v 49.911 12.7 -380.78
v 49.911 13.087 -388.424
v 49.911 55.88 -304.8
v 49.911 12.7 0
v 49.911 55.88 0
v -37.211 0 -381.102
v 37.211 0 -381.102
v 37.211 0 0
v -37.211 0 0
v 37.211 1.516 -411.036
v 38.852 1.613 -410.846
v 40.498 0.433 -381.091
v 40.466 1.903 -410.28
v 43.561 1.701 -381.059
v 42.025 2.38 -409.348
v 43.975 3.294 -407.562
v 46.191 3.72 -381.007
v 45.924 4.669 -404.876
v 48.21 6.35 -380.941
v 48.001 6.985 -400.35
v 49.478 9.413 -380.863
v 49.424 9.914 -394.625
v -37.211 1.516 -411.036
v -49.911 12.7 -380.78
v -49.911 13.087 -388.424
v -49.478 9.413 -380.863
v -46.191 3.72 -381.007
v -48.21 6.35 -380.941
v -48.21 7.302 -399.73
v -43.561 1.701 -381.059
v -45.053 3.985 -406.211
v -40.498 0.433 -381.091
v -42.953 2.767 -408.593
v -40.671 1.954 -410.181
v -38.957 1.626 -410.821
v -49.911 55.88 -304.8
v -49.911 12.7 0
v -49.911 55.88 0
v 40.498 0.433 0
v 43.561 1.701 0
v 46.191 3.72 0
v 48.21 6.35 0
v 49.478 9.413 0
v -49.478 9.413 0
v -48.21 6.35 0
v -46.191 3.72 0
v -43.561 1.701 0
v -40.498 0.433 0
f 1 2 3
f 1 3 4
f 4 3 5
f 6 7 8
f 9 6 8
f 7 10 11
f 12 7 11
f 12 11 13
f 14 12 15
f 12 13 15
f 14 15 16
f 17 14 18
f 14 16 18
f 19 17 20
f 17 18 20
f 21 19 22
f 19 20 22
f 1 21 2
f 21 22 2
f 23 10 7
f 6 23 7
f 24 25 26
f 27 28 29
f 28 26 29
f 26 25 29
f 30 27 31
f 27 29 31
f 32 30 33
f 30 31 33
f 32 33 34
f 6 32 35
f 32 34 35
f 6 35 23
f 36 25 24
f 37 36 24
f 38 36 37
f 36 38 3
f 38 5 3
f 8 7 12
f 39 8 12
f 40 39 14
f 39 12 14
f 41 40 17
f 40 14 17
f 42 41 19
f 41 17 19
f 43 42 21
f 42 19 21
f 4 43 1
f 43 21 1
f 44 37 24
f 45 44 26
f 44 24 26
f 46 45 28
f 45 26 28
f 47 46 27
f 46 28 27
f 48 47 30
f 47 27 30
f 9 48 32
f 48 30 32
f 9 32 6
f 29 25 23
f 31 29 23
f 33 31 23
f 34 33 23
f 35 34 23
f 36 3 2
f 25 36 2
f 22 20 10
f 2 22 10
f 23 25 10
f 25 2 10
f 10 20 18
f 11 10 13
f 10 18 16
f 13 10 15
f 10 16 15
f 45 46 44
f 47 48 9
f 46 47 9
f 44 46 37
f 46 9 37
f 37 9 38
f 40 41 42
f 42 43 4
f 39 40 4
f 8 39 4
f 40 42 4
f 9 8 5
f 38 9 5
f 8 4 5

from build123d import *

# Parameters (mm, degrees)
BOSS_EXTRUDE1_DEPTH = 49.911
FILLET1_R           = 12.7


with BuildPart() as part:
    # Sketch1 → Boss-Extrude1 (new, symmetric)
    with BuildSketch(Plane(origin=(0, 0, 0), x_dir=(0, 0, -1), z_dir=(1, 0, 0))):
        Polygon((0, 0), (0, 55.88), (304.8, 55.88), (411.035788296, 1.516400562), (381.1016, 0), align=None)
    extrude(amount=BOSS_EXTRUDE1_DEPTH, both=True)

    # Fillet1
    # the kernel refuses this fillet: 12.7 mm, written as the material it takes off along each edge
    with BuildSketch(Plane(origin=(49.911, 0, -412.8516), x_dir=(0, 1, 0), z_dir=(0, 0, 1))) as fillet1_piece_1:
        with BuildLine():
            CenterArc((FILLET1_R, FILLET1_R), FILLET1_R, 180, 90)
            Line((0, FILLET1_R), (0, 0))
            Line((0, 0), (FILLET1_R, 0))
        make_face()
    extrude(amount=444.6016, mode=Mode.SUBTRACT)
    with BuildSketch(Plane(origin=(-49.911, 3.12272641, -442.745127887), x_dir=(1, 0, 0), z_dir=(0, -0.0505929400767125, 0.9987193571841863)), Plane(origin=(49.911, 3.12272641, -442.745127887), x_dir=(0, 0.9987193571841864, 0.0505929400767125), z_dir=(0, -0.0505929400767125, 0.9987193571841863))) as fillet1_piece_2:
        with BuildLine():
            CenterArc((FILLET1_R, FILLET1_R), FILLET1_R, 180, 90)
            Line((0, FILLET1_R), (0, 0))
            Line((0, 0), (FILLET1_R, 0))
        make_face()
    extrude(amount=93.472572456, mode=Mode.SUBTRACT)
    with BuildSketch(Plane(origin=(-49.911, 0, -412.8516), x_dir=(0, 1, 0), z_dir=(0, 0, 1))) as fillet1_piece_3:
        with BuildLine():
            CenterArc((FILLET1_R, -FILLET1_R), FILLET1_R, 90, 90)
            Line((0, -FILLET1_R), (0, 0))
            Line((0, 0), (FILLET1_R, 0))
        make_face()
    extrude(amount=444.6016, mode=Mode.SUBTRACT)


solid = part.part
